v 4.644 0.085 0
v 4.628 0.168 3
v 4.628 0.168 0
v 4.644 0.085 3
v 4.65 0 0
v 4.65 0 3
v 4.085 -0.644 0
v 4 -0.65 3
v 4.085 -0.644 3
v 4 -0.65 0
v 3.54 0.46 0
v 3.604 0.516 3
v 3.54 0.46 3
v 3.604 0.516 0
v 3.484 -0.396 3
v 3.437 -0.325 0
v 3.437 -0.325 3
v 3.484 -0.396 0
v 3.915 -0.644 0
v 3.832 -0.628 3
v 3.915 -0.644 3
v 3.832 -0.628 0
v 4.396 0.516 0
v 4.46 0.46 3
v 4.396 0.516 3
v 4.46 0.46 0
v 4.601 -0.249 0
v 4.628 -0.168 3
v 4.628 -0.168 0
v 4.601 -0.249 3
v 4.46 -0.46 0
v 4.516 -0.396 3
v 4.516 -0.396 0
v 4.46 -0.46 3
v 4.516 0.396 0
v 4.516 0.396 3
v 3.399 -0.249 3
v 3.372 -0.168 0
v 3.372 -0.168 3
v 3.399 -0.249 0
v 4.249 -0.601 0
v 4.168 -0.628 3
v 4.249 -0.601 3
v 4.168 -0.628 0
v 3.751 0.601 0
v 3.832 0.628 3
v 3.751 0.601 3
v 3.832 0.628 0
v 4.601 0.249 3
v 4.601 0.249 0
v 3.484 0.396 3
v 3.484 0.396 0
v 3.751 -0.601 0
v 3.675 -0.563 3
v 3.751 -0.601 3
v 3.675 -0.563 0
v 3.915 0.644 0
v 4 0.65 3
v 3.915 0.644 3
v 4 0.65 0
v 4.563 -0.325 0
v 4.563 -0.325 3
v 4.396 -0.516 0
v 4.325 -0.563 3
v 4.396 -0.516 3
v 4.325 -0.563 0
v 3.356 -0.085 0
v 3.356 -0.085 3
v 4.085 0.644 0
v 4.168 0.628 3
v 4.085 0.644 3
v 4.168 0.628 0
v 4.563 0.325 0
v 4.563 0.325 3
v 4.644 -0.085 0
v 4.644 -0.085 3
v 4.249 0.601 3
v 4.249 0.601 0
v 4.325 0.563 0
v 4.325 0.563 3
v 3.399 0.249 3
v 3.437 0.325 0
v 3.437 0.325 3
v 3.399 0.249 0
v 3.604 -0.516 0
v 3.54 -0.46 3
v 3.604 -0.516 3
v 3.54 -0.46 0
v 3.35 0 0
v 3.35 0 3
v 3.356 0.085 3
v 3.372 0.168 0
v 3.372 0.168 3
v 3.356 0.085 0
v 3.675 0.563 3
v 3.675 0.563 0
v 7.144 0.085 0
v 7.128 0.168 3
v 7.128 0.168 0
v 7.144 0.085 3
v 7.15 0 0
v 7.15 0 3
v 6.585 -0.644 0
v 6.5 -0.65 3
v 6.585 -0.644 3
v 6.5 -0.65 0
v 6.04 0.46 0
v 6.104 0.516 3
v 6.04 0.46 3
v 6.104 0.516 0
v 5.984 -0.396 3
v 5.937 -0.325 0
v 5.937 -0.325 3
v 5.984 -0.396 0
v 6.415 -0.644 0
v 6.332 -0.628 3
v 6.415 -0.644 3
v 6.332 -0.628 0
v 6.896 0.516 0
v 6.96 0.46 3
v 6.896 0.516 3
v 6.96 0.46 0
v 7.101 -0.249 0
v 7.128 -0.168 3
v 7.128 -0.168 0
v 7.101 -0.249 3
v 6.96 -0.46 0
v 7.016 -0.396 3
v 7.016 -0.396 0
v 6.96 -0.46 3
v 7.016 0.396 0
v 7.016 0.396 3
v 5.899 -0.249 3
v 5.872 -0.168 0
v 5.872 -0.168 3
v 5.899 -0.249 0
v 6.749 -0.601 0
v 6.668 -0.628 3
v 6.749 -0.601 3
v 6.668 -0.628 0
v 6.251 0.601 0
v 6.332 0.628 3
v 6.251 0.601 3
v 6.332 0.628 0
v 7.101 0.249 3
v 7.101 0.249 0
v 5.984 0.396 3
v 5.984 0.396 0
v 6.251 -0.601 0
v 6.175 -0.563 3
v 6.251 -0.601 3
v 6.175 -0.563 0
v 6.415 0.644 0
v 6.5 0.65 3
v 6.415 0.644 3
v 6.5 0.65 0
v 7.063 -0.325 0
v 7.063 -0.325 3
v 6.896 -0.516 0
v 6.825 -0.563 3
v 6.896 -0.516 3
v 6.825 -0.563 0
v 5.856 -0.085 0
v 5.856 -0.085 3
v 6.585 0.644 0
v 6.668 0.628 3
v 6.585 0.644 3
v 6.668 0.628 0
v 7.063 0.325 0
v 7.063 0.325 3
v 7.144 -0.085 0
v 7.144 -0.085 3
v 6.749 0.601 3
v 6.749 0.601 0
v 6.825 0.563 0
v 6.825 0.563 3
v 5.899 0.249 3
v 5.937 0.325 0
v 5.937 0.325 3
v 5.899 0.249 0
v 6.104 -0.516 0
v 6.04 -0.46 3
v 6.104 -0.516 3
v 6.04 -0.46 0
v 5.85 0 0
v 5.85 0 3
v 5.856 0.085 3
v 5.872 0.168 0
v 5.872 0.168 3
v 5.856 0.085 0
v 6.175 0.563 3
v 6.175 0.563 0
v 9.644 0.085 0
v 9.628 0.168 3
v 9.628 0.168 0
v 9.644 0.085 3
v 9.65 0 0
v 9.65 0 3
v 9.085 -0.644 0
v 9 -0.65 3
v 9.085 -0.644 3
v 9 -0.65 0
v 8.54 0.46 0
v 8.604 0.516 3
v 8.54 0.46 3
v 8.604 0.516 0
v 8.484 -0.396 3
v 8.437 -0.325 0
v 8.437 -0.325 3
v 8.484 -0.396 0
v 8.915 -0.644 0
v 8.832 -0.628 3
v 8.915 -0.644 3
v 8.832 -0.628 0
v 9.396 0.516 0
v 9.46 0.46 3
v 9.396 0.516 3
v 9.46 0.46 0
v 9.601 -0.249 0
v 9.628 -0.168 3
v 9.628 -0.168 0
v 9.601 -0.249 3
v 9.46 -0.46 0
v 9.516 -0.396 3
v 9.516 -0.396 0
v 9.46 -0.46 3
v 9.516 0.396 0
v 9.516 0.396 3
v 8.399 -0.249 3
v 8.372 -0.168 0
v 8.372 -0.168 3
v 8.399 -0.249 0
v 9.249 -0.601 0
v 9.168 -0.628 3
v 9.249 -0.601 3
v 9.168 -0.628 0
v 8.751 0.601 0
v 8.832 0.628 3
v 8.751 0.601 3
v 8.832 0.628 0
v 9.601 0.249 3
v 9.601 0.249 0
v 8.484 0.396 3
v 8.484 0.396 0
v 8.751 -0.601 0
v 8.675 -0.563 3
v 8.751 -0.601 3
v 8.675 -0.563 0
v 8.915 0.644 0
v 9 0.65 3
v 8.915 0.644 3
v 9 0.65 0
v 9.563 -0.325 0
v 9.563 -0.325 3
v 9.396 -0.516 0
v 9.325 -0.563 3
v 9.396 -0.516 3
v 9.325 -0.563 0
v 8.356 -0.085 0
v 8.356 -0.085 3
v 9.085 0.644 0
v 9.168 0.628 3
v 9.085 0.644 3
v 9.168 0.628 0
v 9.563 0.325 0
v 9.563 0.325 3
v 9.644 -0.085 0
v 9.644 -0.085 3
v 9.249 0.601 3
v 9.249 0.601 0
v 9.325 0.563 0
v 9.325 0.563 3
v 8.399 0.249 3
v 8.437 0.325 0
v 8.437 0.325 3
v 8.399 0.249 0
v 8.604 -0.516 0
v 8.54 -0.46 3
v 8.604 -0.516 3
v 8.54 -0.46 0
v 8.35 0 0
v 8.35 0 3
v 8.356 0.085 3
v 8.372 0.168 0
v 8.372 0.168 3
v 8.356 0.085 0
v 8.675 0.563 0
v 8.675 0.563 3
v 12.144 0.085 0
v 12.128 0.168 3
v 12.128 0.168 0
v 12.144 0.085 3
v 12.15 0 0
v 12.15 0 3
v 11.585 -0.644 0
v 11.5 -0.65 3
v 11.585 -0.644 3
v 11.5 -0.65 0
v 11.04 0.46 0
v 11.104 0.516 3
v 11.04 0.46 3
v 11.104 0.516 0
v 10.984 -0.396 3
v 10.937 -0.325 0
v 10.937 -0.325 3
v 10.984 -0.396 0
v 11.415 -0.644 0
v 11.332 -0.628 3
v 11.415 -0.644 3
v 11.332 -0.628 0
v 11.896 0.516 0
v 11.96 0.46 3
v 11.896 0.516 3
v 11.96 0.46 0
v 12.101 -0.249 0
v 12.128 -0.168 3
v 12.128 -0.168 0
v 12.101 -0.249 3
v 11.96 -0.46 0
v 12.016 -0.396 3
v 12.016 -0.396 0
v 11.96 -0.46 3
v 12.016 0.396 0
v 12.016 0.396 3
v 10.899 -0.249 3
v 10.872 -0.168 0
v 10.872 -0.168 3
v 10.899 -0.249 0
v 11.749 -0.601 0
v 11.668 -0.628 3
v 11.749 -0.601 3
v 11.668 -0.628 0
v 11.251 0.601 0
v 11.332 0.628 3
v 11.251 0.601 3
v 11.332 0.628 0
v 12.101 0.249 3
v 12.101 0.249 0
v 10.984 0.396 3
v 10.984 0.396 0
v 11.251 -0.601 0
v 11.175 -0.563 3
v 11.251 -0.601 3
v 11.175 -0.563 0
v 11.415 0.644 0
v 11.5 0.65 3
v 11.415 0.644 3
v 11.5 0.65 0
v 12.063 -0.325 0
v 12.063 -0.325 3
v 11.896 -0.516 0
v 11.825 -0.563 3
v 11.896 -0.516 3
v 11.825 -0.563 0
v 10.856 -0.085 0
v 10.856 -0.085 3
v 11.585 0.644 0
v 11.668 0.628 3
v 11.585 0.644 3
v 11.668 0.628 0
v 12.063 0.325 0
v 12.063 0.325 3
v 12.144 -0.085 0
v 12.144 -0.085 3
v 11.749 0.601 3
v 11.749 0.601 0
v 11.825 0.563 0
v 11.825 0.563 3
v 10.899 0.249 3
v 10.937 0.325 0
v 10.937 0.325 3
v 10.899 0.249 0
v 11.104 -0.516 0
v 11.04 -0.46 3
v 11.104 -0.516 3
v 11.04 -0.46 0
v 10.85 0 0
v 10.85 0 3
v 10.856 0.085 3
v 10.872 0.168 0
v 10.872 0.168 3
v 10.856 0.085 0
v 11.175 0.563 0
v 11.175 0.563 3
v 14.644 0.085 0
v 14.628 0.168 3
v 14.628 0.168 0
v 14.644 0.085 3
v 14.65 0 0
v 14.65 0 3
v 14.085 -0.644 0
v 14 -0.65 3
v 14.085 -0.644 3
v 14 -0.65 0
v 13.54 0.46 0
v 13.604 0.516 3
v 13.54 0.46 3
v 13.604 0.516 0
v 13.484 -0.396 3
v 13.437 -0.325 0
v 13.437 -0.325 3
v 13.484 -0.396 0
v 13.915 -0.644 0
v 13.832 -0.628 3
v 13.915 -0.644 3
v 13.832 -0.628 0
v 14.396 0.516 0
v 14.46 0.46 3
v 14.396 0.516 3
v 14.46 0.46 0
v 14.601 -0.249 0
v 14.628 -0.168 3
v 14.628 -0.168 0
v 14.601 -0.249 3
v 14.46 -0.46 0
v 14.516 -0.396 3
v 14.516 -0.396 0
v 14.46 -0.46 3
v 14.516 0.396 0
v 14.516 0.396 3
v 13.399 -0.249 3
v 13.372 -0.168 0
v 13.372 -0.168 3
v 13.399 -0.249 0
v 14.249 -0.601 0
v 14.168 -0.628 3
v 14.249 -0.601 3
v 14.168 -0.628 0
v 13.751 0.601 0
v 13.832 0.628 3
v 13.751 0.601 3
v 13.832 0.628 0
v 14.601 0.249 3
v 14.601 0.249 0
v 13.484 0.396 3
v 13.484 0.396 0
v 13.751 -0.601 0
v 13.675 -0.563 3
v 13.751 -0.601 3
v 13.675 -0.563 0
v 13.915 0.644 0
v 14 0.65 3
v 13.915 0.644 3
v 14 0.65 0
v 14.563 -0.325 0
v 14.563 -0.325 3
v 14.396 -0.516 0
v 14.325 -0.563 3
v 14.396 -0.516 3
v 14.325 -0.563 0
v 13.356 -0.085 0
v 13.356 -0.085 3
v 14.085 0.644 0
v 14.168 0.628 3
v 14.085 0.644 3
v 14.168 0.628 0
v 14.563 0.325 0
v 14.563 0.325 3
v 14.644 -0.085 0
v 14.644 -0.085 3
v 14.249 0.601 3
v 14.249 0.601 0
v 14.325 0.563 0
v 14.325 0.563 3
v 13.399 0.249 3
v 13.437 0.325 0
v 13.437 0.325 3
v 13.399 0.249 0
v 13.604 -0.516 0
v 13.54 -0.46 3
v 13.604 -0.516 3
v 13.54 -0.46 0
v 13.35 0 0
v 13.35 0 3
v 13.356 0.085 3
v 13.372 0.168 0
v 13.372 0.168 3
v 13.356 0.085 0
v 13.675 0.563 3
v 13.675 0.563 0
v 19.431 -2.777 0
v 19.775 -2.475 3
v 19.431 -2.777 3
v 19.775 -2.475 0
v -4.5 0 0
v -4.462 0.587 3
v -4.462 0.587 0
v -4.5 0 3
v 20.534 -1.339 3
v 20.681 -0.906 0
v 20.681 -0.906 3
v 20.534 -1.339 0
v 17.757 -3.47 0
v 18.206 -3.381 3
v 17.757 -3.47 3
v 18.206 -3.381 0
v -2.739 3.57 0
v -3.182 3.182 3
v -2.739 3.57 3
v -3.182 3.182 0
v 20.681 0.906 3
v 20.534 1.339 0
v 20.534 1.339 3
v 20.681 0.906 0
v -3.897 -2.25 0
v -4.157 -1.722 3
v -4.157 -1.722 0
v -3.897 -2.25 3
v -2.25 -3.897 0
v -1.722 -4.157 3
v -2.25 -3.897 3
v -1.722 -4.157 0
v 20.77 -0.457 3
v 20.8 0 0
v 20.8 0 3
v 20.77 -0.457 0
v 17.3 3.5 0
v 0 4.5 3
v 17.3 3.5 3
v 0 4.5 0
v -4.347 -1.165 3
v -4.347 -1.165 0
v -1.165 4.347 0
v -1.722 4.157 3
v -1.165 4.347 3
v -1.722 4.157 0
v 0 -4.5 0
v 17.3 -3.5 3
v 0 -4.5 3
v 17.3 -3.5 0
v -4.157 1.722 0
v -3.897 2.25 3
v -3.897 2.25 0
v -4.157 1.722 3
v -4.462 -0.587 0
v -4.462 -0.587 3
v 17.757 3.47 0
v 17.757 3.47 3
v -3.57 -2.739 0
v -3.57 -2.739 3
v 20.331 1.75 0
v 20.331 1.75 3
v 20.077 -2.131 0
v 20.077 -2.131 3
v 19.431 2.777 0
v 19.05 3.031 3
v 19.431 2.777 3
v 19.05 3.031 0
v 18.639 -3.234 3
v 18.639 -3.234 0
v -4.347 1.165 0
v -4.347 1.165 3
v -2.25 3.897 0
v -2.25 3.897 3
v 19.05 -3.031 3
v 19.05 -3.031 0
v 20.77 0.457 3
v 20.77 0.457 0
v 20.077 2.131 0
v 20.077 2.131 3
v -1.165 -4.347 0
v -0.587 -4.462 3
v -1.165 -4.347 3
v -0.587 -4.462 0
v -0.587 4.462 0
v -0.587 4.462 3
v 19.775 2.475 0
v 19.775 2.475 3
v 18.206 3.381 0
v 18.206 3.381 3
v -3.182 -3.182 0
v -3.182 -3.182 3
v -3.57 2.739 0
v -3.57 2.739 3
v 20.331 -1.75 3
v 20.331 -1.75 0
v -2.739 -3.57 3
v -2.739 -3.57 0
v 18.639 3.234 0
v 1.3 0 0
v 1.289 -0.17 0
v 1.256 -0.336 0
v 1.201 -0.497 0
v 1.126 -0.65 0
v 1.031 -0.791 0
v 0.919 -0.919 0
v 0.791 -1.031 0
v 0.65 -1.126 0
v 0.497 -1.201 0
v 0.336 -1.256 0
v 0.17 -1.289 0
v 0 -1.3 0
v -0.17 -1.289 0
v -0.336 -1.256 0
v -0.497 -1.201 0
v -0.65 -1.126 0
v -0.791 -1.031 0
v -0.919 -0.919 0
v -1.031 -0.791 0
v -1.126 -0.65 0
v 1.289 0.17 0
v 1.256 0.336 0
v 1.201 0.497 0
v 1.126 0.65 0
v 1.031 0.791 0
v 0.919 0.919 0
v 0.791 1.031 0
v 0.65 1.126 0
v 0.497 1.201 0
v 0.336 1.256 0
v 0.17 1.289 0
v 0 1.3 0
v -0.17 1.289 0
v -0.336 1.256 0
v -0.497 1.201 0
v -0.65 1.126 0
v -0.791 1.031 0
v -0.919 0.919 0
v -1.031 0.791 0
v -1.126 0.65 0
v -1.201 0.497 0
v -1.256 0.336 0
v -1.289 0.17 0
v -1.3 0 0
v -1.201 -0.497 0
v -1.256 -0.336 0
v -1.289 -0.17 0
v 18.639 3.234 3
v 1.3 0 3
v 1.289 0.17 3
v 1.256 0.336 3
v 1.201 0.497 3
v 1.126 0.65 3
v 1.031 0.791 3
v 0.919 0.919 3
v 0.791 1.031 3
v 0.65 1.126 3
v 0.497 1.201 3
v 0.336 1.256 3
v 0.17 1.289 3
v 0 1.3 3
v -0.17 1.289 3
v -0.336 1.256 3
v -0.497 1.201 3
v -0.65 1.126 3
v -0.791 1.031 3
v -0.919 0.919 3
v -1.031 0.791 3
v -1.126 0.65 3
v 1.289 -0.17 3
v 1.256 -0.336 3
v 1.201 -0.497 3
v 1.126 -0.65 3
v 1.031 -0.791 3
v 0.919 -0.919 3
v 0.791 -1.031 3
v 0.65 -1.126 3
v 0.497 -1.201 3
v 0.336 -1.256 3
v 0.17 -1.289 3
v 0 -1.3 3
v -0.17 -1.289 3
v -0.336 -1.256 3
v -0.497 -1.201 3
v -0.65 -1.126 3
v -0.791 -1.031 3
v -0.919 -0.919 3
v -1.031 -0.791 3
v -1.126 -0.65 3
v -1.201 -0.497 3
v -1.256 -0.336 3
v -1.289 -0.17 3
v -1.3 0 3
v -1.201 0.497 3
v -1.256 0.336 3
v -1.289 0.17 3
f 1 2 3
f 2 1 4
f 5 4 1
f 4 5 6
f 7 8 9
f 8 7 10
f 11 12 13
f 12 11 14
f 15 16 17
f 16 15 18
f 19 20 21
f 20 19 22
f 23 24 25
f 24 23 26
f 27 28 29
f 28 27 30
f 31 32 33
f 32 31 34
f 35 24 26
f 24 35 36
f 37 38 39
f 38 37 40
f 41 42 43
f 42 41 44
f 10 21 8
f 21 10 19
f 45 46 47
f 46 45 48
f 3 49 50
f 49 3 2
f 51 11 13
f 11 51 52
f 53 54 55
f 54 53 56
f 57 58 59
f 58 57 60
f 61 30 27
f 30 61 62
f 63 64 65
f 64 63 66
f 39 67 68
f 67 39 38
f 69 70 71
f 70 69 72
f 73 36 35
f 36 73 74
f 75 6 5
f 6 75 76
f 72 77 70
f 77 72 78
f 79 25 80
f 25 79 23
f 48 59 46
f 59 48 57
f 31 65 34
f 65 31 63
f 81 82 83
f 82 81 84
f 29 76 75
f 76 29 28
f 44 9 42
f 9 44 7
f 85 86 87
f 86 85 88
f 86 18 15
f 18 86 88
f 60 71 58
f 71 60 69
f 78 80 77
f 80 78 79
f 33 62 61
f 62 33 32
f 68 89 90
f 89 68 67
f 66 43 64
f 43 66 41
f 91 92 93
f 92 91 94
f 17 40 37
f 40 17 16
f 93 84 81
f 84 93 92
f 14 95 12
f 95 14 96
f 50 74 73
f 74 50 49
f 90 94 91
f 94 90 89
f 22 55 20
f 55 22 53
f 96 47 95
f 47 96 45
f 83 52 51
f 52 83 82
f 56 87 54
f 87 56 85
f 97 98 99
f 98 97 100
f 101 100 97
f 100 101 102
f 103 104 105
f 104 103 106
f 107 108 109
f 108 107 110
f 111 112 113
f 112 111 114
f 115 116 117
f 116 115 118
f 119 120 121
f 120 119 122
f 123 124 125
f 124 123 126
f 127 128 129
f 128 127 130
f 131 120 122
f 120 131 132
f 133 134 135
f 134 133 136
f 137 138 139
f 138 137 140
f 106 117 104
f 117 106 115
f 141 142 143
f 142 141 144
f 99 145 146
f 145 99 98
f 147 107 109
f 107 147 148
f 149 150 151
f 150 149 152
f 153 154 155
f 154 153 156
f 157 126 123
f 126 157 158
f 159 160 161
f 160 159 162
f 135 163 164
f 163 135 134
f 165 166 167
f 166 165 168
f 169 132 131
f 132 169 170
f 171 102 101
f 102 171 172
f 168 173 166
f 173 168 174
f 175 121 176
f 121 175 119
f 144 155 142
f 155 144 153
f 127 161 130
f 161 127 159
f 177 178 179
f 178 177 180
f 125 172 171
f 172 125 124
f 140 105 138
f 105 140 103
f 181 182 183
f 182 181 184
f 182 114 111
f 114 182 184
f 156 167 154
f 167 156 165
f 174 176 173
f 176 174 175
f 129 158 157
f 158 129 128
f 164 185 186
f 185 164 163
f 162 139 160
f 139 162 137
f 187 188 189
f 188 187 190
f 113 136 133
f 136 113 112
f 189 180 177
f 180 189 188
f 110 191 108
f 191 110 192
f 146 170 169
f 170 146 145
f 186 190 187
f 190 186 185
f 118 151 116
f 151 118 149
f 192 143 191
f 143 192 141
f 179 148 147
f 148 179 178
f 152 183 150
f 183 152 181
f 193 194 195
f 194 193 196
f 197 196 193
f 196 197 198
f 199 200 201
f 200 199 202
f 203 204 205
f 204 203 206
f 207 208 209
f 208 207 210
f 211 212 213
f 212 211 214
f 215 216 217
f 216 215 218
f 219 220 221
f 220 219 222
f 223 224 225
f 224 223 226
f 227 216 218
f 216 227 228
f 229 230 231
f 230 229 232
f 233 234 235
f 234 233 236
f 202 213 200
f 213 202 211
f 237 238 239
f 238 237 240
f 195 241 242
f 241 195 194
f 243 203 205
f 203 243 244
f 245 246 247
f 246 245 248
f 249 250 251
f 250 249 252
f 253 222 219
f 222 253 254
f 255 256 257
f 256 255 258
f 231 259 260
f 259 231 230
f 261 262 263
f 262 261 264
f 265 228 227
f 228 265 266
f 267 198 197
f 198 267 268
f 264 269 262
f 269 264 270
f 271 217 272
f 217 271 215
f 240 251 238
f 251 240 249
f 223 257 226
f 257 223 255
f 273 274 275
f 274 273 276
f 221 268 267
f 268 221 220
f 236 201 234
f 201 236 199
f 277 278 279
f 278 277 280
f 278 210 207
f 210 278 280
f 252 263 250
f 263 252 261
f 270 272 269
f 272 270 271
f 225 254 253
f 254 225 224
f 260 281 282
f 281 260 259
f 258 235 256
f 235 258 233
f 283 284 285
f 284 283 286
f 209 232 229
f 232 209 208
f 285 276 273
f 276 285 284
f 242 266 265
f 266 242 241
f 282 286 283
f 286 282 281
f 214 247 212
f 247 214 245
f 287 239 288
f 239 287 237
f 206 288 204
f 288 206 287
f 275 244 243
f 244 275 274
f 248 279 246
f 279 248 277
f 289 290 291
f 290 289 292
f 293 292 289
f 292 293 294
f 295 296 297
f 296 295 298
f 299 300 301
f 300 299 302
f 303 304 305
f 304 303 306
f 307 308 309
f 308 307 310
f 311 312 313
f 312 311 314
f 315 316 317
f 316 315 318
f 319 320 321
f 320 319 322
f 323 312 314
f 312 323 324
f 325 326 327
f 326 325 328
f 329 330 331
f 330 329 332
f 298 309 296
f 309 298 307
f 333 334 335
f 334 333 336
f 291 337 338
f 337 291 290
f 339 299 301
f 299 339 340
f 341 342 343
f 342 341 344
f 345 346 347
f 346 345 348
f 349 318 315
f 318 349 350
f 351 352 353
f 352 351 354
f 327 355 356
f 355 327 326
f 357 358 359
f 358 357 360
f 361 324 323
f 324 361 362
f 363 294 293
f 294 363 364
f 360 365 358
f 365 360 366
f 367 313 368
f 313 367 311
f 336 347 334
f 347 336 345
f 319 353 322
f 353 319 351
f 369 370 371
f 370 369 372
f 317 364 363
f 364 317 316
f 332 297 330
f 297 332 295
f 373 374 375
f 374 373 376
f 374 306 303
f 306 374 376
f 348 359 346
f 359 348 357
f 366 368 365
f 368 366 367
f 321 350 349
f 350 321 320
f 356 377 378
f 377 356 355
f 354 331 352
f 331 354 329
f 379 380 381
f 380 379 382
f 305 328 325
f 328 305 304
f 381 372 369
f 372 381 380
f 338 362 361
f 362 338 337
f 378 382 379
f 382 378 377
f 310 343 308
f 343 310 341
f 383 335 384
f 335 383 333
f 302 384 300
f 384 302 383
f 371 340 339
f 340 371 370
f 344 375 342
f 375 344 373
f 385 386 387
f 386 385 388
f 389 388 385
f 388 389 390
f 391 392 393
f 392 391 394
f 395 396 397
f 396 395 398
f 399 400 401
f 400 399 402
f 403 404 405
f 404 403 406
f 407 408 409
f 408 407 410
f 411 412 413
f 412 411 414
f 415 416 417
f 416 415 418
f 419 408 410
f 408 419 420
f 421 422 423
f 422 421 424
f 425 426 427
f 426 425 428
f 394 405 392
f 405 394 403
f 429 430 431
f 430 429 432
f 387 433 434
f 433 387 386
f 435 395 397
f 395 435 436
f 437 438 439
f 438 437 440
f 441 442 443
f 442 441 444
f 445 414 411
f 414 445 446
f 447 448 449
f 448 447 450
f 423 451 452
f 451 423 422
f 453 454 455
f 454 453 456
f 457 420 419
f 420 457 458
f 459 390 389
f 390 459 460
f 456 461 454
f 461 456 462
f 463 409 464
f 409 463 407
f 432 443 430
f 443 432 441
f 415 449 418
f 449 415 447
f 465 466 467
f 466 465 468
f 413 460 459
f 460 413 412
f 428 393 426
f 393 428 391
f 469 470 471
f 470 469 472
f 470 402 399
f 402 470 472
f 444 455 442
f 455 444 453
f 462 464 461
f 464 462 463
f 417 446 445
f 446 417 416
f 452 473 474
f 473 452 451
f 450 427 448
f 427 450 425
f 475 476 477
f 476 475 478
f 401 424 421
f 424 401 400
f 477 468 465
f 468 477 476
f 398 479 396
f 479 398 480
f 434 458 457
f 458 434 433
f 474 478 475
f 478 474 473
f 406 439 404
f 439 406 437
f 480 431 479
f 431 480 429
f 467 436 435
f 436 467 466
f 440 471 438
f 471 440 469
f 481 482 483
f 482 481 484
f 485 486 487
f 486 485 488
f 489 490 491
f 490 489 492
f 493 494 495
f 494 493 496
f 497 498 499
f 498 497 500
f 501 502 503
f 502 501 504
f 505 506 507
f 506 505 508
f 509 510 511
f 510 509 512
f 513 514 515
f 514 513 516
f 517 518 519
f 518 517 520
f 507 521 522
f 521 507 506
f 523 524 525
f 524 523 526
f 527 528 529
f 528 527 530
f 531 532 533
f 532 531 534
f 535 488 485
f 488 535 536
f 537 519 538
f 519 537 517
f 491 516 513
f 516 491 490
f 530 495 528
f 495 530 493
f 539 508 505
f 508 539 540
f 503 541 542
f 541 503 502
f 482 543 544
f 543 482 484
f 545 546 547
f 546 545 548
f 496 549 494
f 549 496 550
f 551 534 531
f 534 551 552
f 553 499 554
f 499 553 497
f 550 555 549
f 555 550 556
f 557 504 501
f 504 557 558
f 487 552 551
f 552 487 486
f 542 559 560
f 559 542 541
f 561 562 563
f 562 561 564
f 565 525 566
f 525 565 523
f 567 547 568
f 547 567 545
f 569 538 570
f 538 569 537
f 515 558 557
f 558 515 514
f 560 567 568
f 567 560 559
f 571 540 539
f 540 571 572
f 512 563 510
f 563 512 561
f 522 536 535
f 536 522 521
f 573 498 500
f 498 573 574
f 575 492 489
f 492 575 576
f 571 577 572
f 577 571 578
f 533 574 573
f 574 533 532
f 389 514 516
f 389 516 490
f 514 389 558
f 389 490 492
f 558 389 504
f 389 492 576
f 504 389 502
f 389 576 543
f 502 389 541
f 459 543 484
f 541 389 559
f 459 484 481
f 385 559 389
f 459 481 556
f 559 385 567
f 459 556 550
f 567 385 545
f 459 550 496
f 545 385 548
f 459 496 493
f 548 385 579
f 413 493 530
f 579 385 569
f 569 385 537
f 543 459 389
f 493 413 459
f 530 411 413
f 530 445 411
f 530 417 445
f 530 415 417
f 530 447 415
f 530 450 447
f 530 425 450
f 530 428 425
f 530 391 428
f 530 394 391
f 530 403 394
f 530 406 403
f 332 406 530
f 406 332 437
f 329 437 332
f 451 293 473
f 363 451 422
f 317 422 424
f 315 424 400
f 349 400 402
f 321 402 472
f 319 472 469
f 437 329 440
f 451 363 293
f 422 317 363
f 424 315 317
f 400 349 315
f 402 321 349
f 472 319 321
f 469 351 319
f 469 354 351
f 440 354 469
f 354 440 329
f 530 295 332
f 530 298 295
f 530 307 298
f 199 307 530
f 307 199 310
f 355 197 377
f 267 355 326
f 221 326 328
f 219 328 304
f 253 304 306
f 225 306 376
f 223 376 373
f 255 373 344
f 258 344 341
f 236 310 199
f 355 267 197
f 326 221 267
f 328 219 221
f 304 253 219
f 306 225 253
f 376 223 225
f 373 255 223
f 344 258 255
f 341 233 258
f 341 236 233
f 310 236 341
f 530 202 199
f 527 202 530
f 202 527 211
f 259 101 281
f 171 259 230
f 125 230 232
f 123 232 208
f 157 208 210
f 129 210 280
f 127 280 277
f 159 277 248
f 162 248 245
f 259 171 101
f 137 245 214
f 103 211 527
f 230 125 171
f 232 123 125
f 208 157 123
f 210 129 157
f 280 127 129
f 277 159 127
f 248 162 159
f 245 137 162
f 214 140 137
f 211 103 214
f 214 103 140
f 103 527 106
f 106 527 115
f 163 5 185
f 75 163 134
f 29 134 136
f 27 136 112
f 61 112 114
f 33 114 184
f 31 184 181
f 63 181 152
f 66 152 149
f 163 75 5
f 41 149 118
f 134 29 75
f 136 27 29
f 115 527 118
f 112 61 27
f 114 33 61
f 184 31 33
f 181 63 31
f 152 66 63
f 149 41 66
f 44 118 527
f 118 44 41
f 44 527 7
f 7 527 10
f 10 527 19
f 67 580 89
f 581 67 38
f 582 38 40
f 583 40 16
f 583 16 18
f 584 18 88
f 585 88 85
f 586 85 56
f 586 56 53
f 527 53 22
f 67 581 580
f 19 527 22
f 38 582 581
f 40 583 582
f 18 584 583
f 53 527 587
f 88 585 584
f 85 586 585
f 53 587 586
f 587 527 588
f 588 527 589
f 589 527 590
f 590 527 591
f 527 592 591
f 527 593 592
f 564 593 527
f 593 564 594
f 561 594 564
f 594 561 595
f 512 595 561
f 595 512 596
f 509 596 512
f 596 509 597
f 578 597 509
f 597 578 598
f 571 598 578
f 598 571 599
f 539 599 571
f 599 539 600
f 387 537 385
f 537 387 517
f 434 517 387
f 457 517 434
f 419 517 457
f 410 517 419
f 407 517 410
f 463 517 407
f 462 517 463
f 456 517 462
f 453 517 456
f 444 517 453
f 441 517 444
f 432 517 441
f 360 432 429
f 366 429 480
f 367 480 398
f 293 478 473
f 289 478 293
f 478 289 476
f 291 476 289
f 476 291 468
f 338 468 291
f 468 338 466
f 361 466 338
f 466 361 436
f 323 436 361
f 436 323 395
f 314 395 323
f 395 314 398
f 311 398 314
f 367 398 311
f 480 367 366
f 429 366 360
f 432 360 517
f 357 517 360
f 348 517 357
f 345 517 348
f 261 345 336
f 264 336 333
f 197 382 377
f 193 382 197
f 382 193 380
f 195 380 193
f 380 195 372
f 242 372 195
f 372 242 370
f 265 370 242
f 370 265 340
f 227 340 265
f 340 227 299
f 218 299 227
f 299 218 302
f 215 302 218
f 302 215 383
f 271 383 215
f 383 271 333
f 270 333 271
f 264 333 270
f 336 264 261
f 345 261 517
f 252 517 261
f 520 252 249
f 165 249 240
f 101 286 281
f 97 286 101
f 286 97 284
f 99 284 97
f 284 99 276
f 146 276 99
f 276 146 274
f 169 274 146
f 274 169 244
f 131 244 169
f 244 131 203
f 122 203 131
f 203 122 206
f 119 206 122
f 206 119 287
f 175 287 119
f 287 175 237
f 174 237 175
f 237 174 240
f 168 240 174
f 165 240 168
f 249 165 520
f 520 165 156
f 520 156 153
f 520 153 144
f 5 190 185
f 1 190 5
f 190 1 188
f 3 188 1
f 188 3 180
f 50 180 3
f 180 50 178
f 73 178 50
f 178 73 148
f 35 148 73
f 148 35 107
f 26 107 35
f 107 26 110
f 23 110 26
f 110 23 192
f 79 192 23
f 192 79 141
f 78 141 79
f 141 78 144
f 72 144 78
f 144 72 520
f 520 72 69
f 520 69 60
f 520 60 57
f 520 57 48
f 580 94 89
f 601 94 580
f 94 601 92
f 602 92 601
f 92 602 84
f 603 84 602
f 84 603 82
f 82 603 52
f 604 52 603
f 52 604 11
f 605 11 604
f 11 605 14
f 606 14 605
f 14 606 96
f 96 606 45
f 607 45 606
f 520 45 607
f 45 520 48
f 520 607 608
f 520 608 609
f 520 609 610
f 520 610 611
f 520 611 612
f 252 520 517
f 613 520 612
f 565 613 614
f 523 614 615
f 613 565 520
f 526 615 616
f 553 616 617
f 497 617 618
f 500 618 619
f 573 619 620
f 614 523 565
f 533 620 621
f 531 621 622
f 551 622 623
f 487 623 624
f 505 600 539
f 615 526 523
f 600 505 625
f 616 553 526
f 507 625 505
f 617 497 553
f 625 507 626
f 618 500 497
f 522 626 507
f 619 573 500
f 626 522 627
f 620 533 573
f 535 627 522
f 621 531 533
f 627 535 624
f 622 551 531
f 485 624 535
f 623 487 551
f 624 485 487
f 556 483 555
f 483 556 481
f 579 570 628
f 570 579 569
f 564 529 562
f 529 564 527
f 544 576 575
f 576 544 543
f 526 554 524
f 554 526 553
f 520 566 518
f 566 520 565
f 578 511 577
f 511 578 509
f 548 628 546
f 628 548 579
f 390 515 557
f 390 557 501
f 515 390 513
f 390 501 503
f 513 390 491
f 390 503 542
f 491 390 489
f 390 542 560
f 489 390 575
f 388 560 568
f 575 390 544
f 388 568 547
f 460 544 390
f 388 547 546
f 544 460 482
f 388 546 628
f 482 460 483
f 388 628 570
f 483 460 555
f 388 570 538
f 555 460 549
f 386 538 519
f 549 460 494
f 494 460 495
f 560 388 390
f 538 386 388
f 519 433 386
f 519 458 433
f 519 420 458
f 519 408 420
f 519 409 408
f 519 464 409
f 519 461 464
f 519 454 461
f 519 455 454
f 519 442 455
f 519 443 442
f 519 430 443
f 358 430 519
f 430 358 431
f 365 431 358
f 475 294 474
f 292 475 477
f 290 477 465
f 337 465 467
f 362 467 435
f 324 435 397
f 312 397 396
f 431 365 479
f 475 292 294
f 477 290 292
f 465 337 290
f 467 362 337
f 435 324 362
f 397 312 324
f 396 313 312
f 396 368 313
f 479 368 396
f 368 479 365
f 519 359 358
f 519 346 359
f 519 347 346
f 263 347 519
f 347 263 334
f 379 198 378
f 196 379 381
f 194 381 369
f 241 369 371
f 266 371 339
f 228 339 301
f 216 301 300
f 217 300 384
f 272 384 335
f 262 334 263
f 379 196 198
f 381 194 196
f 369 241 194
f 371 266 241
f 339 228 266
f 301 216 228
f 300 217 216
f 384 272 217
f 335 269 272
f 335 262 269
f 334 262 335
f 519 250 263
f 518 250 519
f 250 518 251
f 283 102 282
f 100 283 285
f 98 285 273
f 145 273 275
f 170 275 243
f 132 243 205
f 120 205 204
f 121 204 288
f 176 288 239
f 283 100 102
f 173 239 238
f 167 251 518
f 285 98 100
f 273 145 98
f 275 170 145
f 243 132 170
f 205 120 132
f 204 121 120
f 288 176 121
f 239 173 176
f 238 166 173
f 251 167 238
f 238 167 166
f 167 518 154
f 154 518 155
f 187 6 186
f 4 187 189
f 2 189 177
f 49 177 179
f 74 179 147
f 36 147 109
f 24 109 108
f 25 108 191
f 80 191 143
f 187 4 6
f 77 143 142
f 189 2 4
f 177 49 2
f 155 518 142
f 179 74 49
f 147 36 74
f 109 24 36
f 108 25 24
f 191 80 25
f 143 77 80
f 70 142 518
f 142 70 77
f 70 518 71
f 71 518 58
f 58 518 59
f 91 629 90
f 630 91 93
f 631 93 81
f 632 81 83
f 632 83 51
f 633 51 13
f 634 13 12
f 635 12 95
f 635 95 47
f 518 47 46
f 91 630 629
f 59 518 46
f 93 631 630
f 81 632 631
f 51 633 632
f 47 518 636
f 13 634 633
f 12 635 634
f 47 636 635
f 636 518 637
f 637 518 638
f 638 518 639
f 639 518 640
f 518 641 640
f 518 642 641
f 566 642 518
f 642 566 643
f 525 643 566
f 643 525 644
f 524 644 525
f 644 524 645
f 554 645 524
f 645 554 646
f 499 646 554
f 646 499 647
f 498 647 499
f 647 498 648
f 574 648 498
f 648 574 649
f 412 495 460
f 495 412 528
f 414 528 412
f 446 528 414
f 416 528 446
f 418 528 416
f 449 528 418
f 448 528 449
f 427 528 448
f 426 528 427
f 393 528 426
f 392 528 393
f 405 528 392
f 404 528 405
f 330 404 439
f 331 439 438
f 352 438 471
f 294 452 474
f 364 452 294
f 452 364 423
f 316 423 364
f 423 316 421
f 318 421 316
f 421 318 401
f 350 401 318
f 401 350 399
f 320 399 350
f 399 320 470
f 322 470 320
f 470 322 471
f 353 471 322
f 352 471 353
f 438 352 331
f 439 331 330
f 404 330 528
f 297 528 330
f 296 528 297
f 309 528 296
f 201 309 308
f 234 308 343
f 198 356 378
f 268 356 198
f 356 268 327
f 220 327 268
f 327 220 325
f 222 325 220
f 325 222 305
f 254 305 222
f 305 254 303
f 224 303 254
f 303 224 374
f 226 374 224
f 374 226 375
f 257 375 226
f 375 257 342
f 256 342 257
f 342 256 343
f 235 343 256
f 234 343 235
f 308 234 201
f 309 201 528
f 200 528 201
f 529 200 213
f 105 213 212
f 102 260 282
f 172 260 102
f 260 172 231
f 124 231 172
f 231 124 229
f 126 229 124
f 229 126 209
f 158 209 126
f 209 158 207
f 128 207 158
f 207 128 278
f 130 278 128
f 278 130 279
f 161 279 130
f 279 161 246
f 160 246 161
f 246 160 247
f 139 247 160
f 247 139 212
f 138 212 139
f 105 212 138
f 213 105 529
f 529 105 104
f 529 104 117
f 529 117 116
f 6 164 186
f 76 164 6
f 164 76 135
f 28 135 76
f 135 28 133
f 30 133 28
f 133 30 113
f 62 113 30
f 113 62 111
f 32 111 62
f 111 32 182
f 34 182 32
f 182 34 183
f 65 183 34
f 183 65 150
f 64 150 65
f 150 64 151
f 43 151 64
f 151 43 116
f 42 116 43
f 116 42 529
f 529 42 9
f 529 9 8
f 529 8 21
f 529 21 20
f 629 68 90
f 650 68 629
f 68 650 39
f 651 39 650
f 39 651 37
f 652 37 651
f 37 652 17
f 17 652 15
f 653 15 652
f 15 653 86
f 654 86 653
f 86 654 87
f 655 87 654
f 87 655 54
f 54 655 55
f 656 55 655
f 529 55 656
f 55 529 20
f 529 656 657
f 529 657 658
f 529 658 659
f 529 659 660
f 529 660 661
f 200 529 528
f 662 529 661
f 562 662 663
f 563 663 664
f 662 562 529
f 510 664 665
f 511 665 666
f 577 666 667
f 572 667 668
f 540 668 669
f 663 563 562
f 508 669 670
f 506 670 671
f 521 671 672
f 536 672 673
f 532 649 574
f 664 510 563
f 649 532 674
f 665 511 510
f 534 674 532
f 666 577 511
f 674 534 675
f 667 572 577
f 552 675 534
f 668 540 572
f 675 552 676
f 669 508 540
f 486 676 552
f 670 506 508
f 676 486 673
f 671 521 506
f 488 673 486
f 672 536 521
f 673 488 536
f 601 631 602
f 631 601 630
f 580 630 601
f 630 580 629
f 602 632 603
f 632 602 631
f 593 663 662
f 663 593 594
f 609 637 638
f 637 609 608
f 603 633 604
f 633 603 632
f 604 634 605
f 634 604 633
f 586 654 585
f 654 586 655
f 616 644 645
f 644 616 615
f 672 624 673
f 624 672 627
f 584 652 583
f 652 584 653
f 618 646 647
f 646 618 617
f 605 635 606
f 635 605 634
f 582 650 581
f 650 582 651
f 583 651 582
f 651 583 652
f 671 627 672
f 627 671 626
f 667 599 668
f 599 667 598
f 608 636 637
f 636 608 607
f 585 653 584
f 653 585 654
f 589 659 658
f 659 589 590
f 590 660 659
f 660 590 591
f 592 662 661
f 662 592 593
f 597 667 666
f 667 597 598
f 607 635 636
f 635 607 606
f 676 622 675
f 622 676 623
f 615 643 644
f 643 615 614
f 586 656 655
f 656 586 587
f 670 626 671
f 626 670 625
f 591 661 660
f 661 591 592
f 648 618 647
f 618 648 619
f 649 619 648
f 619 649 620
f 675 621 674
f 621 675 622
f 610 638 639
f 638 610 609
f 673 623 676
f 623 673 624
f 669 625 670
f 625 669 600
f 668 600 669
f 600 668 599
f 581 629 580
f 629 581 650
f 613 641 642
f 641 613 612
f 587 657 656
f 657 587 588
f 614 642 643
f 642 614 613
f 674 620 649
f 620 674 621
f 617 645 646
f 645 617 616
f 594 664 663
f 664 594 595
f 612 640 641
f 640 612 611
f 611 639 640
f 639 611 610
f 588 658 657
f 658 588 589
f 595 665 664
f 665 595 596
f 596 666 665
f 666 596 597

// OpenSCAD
// file: measurements.scad
// Measurements of YOUR table, shared by every printed part, in millimetres.
//
// These are placeholders until the real table is measured with calipers. Edit
// the numbers here (nothing else in this file), save, then open a part and
// export it. See docs/3d-printing.md.

// --- The playfield ----------------------------------------------------------

// Thickness of the playfield at the trapdoor holes.
playfield_thickness = 12.7;

// --- Each trapdoor hole ------------------------------------------------------
// "Width" runs across the table (left to right); "length" runs up the table.

// Width of the hole.
hole_width = 40;

// Length of the hole.
hole_length = 40;

// --- Screws -----------------------------------------------------------------

// Wood screws into the underside of the playfield. They must be SHORTER than
// the playfield is thick, or they'll come out through the artwork. 3.5 mm x
// 9.5 mm (No. 6 x 3/8") suits a 12.7 mm playfield.
wood_screw_diameter = 3.5;

// Steel rod used as each flap's hinge pin.
hinge_pin_diameter = 2;

// --- Printing ---------------------------------------------------------------

// Gap left between parts that fit together, for a typical printer. Make it
// bigger if parts are too tight, smaller if they're loose.
fit_clearance = 0.4;
// file: common.scad
// Shared helpers for the printed parts. Nothing to change here: table sizes
// are in measurements.scad, and each part's options are in its own file.

include <measurements.scad>

// A real pinball: 1 1/16 inch.
ball_diameter = 27;

// Smooth enough curves for printing.
$fn = 48;

// A countersunk hole for a wood screw going up into the playfield, through a
// plate `thickness` thick lying on z = 0 (its top face is the side that
// presses against the playfield).
module wood_screw_hole(thickness) {
    head = wood_screw_diameter * 2;
    translate([0, 0, -0.01]) {
        cylinder(d = wood_screw_diameter + 0.3, h = thickness + 0.02);
        // The head sits in the face away from the playfield.
        cylinder(d1 = head, d2 = wood_screw_diameter + 0.3, h = (head - wood_screw_diameter) / 2);
    }
}

// --- Trapdoor geometry, shared so the frame, flap, lifter and chute fit -----
//
// Coordinates: the origin is the centre of the hole on the playfield's
// underside. x runs across the table (left to right), y up the table (towards
// the back), z up. The playfield's top surface is at z = playfield_thickness.

// The frame's sleeve slides up into the hole.
frame_wall = 2;
outer_width = hole_width - fit_clearance;
outer_length = hole_length - fit_clearance;
inner_width = outer_width - 2 * frame_wall;
inner_length = outer_length - 2 * frame_wall;
// The flange under the playfield.
flange_width = 10;
flange_thickness = 4;

// The flap: a plate that sits flush in the top of the frame, pivoting on the
// hinge pin along its uphill (back) edge.
flap_thickness = 3;
knuckle_radius = 2.5;
pin_y = inner_length / 2 - knuckle_radius - fit_clearance;
pin_z = playfield_thickness - knuckle_radius;
flap_width = inner_width - 2 * fit_clearance;
flap_front = -inner_length / 2 + fit_clearance;

// The servo (an MG90S) hangs under the flange on the right, its shaft pointing
// left into the frame, and turns the lifter arm that the flap rests on.
servo_body = [22.8, 12.2, 22.5];  // long, wide, top face to base
servo_shaft_from_end = 5.9;       // shaft centre from the near end of the body
servo_tab_from_top = 6.5;         // mounting tabs below the shaft's face
servo_tab_spacing = 27.8;
servo_tab_hole = 1.8;             // for the screws that come with the servo
// Where the lifter arm swings: just inside the frame's right wall.
lifter_thickness = 3;
lifter_x = inner_width / 2 - 1 - lifter_thickness;
servo_top_x = lifter_x + lifter_thickness + 3;  // the horn sits ~3 mm out
servo_shaft_y = flap_front + 9;                 // under the flap's front edge
servo_shaft_z = -flange_thickness - servo_body[1] / 2 - 1;
// The lifter reaches from the shaft up to the underside of the closed flap.
lifter_length = playfield_thickness - flap_thickness - servo_shaft_z;

// The chute catches the ball beside the lifter and servo: from the frame's left
// wall to just short of the lifter arm.
chute_wall = 2.5;
chute_right = lifter_x - 1 - chute_wall;
chute_opening = chute_right + inner_width / 2;
// Pilot holes in the frame's flange for the chute's two screws (M3 x 6 mm
// self-tapping): one on the left, one at the front.
chute_screws = [
    [-(outer_width / 2 + flange_width / 2), 0],
    [(chute_right - inner_width / 2) / 2, -(outer_length / 2 + flange_width / 2)],
];
assert(chute_opening >= ball_diameter + 1,
    "The hole is too narrow for the ball to fall past the lifter arm: check hole_width in measurements.scad.");
// main file
// Lifter arm: one per trapdoor. Screw it to the single-arm horn that comes with
// the MG90S servo. The flap rests on its rounded tip: pointing straight up, it
// holds the flap closed and flush; turned down, the flap follows it open.
// Test mode's flaps stage sets both angles.
//
// Print it flat, no supports.

include <common.scad>

lifter();

module lifter() {
    width = 7;
    difference() {
        hull() {
            cylinder(d = width + 2, h = lifter_thickness);
            translate([lifter_length - width / 2, 0, 0]) cylinder(d = width, h = lifter_thickness);
        }
        // The horn's centre screw.
        translate([0, 0, -1]) cylinder(d = 2.6, h = lifter_thickness + 2);
        // A row of small holes: screw through whichever line up with the
        // horn's holes.
        for (x = [4 : 2.5 : 14])
            translate([x, 0, -1]) cylinder(d = 1.3, h = lifter_thickness + 2);
    }
}
